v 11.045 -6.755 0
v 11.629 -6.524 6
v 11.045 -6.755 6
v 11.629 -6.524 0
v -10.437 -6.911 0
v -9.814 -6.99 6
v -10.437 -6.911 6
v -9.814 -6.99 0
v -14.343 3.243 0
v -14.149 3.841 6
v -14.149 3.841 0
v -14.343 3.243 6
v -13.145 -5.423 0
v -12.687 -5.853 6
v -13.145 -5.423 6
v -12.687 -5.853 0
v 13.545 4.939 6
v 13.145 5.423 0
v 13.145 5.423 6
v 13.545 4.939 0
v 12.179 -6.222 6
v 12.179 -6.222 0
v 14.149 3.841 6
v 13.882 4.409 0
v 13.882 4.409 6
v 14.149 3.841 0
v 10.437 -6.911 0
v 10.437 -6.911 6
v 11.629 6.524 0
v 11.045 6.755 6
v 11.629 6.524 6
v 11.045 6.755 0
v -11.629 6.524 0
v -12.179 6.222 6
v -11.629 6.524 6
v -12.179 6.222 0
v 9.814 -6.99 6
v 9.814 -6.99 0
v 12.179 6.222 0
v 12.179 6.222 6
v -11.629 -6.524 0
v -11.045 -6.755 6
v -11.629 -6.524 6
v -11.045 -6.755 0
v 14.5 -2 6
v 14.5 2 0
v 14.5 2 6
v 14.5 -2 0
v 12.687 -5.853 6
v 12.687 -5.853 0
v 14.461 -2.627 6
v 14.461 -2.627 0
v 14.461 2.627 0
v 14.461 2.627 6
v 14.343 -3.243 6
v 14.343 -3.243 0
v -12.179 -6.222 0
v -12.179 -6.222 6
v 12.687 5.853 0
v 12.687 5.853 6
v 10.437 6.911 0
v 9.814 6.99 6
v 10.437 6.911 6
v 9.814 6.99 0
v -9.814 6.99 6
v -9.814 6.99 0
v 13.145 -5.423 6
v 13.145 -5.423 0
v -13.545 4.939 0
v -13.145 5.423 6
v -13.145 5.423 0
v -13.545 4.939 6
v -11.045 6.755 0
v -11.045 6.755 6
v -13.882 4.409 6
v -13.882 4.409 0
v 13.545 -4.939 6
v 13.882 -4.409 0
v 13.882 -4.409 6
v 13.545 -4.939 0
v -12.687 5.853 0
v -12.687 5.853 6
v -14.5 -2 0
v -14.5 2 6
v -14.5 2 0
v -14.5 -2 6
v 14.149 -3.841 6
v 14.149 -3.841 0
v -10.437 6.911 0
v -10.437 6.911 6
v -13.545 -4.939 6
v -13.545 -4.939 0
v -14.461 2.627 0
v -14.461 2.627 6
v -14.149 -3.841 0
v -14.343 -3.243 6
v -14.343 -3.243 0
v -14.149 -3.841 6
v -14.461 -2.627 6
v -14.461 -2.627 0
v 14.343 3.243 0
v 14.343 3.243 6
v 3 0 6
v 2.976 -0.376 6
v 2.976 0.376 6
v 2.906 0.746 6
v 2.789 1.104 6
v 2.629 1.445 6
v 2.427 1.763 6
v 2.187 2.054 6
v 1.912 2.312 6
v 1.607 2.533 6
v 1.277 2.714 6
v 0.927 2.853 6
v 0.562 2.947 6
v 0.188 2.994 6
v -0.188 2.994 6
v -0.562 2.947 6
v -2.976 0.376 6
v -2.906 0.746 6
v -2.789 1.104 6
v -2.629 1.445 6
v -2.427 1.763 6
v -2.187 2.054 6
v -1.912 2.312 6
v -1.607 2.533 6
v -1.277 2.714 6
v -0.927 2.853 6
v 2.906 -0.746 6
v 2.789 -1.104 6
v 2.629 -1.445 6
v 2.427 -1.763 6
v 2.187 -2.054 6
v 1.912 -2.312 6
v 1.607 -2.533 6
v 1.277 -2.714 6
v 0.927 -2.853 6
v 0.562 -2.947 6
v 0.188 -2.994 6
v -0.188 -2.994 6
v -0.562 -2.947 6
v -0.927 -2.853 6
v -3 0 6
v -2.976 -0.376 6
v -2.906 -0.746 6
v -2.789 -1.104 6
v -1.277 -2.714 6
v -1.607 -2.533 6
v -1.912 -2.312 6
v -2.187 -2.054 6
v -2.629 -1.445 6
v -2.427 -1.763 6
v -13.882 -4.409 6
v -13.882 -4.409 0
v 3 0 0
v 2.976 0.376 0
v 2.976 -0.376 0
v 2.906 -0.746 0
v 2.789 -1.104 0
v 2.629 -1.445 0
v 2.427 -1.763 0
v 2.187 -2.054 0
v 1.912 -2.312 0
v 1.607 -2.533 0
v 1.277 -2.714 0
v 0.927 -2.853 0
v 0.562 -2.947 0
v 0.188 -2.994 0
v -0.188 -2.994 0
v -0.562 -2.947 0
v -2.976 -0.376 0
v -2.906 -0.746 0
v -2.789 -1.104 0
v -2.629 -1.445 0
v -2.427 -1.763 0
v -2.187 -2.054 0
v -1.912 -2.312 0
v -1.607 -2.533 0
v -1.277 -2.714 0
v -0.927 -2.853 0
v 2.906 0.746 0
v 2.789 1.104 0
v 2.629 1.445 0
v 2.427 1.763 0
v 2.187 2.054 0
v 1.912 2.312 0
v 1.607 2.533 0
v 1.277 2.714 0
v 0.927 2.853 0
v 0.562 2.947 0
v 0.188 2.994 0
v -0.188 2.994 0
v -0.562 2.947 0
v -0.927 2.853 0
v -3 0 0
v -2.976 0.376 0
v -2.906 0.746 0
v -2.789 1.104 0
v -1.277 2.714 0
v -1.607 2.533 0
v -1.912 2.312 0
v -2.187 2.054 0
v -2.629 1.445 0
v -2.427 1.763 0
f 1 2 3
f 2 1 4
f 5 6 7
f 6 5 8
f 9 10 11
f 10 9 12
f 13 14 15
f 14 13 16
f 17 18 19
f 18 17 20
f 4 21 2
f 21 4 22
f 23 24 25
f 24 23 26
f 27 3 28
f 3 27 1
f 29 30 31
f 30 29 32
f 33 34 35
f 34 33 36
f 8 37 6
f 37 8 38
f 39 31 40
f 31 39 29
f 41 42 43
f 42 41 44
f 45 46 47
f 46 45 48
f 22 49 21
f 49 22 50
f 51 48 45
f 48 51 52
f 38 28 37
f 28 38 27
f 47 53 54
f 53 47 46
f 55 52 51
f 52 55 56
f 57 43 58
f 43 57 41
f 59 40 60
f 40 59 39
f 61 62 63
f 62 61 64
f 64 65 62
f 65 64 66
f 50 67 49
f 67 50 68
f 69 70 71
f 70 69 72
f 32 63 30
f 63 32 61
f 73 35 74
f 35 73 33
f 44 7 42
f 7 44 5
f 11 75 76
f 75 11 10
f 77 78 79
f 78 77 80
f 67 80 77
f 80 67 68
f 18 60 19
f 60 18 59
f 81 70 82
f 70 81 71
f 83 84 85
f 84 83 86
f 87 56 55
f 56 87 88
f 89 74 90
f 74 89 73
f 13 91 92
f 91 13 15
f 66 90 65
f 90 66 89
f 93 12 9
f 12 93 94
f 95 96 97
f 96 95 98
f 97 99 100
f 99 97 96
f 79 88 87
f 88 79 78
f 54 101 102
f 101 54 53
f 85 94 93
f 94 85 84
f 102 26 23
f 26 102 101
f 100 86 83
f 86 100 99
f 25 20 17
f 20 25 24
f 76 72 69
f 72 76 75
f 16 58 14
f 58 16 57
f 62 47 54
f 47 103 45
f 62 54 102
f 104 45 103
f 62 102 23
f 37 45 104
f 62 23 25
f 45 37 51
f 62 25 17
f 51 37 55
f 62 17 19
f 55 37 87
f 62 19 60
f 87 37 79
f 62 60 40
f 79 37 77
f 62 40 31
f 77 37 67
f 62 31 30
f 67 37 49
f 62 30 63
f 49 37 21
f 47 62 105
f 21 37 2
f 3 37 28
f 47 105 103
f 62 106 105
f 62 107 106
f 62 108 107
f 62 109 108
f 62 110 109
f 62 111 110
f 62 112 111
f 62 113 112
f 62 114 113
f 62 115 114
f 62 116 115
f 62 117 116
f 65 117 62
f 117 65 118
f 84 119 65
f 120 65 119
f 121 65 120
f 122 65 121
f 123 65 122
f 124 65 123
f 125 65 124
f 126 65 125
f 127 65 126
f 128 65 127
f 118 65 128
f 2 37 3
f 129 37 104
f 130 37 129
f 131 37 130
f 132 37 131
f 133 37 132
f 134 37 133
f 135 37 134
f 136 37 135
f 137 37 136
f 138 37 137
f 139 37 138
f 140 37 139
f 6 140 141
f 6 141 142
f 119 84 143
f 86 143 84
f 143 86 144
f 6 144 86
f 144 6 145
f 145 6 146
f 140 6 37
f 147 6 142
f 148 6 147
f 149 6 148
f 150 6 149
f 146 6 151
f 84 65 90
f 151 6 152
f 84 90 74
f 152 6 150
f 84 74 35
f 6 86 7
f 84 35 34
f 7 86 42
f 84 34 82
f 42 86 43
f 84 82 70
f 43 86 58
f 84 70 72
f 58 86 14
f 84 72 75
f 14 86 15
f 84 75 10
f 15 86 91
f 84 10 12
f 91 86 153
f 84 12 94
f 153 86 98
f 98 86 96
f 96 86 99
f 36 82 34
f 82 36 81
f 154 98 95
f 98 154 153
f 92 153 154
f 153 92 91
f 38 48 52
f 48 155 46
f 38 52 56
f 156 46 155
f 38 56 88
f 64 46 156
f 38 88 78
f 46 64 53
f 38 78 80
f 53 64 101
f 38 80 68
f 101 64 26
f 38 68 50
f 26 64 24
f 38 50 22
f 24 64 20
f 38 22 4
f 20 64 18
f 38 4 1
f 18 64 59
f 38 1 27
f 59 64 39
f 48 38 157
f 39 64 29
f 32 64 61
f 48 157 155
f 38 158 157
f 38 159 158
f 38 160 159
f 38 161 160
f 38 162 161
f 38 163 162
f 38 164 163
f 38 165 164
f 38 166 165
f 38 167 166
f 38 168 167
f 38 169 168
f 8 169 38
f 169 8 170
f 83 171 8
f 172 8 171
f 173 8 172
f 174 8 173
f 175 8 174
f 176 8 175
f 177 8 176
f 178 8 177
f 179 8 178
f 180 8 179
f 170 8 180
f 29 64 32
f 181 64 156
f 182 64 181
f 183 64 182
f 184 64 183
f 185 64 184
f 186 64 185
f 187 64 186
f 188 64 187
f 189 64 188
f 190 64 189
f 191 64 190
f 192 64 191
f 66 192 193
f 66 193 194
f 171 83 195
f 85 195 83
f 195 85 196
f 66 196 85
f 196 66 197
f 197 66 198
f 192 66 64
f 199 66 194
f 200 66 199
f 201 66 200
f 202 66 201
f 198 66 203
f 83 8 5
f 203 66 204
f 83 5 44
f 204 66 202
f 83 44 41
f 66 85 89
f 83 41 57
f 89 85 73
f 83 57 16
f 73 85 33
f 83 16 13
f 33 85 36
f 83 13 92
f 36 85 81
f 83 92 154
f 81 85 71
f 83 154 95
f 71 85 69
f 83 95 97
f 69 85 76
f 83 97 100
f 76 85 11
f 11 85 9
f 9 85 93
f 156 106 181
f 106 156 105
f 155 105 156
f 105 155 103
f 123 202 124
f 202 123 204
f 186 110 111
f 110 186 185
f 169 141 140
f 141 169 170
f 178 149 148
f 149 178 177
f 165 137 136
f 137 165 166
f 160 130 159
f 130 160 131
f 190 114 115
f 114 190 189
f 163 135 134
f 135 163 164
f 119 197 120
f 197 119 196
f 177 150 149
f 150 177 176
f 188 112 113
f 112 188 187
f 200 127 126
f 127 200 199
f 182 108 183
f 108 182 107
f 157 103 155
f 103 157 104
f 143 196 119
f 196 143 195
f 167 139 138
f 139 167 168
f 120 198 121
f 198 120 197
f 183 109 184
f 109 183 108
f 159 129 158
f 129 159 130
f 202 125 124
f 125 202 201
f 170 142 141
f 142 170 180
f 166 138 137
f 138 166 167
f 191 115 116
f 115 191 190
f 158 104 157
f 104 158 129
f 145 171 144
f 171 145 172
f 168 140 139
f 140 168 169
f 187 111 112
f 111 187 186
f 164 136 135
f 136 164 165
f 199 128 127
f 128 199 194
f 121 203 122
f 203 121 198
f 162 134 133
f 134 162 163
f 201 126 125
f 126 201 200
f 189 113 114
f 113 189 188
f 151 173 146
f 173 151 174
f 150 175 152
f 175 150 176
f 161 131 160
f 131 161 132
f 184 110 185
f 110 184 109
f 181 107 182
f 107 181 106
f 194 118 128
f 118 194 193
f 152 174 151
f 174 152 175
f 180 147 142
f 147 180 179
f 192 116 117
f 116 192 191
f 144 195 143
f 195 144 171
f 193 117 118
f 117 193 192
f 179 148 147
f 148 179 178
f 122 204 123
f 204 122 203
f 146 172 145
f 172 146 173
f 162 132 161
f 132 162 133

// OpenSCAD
$fn = 50;

difference() {
	union() {
		hull() {
			translate(v = [-9.5, 2.0, 0]) {
				cylinder(h = 6, r = 5);
			}
			translate(v = [9.5, 2.0, 0]) {
				cylinder(h = 6, r = 5);
			}
			translate(v = [-9.5, -2.0, 0]) {
				cylinder(h = 6, r = 5);
			}
			translate(v = [9.5, -2.0, 0]) {
				cylinder(h = 6, r = 5);
			}
		}
	}
	union() {
		cylinder(h = 6, r = 3.0);
	}
}
